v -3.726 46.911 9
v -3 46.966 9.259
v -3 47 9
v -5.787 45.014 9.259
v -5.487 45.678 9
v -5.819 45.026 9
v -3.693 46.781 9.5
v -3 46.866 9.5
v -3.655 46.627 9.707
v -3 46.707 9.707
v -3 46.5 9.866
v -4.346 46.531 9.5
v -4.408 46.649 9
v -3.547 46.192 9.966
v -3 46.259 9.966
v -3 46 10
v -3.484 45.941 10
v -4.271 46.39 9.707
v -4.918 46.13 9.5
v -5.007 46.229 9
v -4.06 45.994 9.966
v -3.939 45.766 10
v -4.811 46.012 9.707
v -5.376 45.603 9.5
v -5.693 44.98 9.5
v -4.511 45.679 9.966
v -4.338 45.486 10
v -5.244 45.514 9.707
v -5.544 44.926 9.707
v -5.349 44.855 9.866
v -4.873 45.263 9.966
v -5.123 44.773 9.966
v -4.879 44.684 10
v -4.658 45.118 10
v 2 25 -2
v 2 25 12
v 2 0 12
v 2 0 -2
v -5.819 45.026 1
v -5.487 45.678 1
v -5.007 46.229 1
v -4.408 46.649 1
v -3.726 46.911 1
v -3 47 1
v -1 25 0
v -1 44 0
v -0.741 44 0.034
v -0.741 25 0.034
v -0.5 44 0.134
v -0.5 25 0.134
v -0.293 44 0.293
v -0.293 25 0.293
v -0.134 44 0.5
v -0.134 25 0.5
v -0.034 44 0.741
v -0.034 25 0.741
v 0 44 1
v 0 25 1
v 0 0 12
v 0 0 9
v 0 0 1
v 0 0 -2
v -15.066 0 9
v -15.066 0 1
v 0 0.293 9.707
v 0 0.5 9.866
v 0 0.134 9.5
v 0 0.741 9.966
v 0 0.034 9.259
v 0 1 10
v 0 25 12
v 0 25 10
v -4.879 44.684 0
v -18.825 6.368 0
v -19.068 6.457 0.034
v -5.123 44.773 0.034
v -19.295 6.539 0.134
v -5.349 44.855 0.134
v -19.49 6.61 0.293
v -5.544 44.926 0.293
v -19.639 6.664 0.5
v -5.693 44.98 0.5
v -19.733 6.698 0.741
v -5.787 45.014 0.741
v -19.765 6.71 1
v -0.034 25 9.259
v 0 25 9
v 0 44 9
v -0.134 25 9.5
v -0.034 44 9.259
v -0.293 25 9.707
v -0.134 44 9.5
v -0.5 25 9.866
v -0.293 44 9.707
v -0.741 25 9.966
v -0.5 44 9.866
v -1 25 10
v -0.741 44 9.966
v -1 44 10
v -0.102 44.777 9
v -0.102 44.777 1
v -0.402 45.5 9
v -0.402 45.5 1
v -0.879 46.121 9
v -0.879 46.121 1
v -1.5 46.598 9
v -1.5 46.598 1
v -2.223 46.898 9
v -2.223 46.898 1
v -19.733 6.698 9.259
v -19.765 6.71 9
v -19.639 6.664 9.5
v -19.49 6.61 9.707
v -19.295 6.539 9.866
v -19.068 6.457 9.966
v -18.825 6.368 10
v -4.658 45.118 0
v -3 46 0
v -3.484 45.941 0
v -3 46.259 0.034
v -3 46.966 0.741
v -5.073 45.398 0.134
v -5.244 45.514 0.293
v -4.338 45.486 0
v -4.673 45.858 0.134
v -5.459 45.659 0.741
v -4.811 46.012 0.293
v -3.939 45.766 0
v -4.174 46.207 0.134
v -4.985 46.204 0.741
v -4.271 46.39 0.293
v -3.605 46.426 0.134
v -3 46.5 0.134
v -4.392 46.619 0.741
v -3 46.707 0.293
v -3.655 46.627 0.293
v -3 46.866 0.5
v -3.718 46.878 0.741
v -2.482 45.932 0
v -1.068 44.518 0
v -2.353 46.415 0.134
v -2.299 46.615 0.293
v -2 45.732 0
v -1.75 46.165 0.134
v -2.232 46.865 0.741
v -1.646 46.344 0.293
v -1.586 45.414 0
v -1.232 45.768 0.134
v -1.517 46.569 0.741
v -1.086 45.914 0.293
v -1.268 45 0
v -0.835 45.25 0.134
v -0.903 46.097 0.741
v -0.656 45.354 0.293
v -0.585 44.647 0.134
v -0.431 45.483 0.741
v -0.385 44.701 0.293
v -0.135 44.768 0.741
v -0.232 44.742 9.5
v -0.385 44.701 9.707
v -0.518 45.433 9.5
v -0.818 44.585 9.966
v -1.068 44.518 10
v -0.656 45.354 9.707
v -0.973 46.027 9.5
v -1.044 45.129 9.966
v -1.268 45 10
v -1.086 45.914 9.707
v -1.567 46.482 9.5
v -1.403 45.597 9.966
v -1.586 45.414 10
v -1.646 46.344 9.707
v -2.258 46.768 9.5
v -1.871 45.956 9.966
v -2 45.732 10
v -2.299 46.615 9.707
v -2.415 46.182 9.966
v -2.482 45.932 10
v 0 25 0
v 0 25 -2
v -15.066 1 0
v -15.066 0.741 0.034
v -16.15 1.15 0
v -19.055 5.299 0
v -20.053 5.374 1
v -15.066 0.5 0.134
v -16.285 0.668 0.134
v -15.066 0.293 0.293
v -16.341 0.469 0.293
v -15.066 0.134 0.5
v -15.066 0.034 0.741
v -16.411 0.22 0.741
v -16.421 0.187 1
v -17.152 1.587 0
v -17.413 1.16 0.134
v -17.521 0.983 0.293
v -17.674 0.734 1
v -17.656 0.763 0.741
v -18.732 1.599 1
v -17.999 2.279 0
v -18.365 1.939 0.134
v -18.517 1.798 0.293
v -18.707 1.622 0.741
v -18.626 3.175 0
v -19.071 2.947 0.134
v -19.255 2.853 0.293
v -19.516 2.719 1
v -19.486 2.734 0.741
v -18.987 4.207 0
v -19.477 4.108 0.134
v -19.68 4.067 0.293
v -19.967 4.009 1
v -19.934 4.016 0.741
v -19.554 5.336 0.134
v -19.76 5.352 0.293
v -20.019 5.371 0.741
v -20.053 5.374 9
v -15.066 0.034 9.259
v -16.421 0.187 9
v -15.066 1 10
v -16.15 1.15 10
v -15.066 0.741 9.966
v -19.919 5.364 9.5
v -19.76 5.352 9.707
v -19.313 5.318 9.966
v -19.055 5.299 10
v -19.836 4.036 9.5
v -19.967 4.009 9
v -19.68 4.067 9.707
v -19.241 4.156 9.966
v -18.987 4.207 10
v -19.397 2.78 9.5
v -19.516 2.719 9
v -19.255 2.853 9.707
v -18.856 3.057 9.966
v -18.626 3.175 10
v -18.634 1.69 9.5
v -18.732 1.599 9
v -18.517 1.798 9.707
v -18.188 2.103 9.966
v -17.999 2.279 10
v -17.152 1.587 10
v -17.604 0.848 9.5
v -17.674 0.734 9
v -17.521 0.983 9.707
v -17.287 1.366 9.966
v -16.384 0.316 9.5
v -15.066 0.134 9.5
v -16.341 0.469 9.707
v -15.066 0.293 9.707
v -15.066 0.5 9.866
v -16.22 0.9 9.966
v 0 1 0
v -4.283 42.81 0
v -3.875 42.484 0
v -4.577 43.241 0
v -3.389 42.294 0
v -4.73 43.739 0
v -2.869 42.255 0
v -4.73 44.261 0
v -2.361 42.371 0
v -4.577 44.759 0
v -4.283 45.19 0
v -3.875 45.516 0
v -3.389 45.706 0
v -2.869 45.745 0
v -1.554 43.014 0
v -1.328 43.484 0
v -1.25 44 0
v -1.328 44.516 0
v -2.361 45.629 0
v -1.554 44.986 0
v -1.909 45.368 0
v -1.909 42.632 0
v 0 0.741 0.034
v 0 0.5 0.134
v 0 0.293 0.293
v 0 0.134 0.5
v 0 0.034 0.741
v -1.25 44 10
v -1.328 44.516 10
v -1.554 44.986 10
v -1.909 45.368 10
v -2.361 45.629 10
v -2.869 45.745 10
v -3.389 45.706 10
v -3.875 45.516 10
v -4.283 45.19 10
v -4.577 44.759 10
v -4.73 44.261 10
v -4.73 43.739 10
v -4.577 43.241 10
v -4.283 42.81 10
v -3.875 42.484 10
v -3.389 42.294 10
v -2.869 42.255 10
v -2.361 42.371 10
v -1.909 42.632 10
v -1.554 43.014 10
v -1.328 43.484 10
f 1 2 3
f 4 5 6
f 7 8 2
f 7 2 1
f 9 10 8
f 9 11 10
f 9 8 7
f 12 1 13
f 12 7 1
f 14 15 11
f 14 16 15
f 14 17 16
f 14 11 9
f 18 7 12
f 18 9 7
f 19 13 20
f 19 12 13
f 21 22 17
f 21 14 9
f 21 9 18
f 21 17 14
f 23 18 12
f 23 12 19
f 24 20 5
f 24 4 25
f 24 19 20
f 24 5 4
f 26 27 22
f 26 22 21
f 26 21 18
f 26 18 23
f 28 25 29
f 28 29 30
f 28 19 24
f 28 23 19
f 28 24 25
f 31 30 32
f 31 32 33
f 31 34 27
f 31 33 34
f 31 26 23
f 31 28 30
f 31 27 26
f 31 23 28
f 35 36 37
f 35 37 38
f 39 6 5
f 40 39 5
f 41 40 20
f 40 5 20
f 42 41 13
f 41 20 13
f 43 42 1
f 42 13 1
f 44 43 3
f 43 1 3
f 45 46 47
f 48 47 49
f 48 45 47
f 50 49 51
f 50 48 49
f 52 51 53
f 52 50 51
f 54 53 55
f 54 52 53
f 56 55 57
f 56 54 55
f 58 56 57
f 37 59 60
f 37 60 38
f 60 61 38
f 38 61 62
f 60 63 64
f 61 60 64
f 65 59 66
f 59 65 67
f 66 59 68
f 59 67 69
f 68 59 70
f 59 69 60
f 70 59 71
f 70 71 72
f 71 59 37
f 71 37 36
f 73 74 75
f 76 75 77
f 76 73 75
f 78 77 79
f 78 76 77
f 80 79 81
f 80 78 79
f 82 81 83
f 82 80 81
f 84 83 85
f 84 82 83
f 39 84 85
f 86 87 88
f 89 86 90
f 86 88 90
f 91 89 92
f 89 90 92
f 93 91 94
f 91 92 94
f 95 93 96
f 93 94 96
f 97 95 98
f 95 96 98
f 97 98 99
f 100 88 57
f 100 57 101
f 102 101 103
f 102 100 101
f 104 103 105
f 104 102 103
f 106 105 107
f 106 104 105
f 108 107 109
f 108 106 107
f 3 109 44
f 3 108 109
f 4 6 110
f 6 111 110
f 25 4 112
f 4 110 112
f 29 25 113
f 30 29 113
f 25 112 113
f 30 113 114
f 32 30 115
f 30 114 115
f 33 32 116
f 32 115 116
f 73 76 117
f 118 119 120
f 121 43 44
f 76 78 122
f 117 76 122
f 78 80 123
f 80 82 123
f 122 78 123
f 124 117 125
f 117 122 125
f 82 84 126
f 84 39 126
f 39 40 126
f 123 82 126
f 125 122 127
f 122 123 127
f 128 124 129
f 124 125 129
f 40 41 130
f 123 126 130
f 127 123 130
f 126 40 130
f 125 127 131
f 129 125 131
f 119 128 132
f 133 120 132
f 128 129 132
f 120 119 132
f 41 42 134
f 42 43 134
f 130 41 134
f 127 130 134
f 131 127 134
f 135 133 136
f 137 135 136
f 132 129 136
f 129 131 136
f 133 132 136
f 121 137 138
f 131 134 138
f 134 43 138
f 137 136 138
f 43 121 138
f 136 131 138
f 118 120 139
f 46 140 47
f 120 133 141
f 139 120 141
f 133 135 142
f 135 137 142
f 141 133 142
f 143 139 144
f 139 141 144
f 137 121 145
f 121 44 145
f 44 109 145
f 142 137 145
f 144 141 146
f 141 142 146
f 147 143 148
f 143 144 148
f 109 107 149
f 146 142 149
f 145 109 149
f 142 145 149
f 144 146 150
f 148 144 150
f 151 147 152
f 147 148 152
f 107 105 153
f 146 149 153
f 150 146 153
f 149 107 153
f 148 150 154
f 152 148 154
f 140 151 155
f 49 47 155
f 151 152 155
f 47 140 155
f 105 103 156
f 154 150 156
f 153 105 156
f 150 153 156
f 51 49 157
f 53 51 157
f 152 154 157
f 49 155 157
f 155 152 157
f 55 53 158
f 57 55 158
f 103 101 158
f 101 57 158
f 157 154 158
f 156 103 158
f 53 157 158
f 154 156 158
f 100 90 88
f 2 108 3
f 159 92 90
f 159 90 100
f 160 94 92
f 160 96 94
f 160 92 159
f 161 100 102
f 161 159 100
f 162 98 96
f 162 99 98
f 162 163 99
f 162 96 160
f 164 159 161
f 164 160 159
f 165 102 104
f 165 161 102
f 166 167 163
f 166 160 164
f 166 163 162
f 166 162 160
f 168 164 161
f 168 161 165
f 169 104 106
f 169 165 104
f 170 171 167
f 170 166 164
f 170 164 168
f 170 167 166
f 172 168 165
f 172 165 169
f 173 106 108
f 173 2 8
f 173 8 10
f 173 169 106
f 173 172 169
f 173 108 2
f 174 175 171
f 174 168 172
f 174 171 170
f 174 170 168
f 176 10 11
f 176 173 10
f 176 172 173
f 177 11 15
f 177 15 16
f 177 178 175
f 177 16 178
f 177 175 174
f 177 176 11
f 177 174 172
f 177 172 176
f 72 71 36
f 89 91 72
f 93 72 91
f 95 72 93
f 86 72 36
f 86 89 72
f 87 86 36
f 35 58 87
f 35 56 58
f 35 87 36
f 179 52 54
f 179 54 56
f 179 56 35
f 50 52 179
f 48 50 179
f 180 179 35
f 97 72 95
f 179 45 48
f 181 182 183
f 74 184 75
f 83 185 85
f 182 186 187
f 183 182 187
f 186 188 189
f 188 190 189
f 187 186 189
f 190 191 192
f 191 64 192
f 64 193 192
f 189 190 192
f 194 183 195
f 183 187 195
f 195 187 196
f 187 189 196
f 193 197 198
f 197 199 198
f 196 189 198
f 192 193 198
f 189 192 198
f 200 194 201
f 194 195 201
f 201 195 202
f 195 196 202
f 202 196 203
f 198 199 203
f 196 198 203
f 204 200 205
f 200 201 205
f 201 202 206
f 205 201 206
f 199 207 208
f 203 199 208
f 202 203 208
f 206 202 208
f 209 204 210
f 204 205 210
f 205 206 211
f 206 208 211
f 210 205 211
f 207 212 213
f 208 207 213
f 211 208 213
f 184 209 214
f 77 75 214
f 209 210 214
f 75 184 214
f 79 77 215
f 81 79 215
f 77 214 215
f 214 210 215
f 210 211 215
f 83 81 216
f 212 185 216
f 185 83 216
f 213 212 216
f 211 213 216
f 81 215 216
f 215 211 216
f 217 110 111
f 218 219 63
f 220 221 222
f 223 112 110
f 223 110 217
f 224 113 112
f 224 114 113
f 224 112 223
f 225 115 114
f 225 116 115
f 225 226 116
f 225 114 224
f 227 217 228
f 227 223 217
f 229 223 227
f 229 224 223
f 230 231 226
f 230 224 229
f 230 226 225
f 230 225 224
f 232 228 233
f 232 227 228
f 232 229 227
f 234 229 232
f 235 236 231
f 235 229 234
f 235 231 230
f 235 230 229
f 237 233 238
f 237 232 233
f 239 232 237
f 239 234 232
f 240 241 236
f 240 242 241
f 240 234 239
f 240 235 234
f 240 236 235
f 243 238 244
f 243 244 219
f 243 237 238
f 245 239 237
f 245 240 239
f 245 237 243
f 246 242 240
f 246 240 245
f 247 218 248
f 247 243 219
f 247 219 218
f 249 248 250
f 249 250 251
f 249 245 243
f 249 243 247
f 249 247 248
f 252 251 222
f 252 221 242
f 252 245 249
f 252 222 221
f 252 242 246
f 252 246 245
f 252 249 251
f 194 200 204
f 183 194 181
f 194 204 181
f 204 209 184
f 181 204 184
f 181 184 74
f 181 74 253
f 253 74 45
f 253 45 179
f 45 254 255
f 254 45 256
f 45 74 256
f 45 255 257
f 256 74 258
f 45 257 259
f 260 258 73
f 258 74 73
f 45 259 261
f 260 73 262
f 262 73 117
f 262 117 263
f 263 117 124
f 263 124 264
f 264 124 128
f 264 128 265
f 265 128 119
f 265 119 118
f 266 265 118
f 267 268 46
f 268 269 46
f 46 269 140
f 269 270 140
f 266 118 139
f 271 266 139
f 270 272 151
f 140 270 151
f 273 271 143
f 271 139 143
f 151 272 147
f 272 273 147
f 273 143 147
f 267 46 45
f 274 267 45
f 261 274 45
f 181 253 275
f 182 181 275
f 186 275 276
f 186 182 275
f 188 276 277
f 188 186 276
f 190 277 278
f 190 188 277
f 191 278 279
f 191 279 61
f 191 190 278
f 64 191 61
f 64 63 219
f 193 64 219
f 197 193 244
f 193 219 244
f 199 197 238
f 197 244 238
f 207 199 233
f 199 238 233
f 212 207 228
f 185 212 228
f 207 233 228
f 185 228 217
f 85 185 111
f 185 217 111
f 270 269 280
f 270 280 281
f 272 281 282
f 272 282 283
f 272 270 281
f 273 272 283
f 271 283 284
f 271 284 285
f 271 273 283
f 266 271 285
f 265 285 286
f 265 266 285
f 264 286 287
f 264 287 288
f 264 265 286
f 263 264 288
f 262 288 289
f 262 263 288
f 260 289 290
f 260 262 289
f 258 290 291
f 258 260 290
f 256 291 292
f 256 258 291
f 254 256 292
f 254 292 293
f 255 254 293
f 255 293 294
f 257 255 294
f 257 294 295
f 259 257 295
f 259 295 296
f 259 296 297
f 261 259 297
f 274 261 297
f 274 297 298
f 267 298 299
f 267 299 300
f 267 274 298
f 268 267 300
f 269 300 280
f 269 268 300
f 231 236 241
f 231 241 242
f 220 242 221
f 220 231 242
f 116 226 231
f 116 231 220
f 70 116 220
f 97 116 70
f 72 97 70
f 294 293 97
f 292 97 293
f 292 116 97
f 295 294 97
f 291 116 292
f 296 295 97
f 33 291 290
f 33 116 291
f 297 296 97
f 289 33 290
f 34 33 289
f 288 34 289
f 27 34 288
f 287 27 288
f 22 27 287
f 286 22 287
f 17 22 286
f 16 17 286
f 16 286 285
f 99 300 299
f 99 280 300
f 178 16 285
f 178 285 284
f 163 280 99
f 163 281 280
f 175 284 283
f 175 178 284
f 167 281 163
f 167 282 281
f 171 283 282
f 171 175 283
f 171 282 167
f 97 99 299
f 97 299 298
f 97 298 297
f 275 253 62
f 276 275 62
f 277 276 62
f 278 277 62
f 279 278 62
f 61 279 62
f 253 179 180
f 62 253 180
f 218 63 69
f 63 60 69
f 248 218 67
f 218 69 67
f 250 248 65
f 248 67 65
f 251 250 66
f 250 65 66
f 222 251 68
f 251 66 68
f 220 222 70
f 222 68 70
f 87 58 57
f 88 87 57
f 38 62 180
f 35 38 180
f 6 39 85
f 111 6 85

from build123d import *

# Parameters (mm, degrees)
SKIZZE1_R                       = 1.75
AUFSATZ_LINEAR_AUSTRAGEN1_DEPTH = 10
SKIZZE2_W                       = 14
SKIZZE2_H                       = 25
AUFSATZ_LINEAR_AUSTRAGEN2_DEPTH = 2
VERRUNDUNG5_R                   = 3
VERRUNDUNG6_R                   = 5
VERRUNDUNG7_R                   = 1


with BuildPart() as part:
    # Skizze1 → Aufsatz-Linear austragen1 (new body)
    with BuildSketch(Plane.XY):
        Polygon((0, 0), (0, 47), (-5.100622615, 47), (-22.207223625, 0), align=None)
        with Locations((-3, 44)):
            Circle(SKIZZE1_R, mode=Mode.SUBTRACT)
    extrude(amount=AUFSATZ_LINEAR_AUSTRAGEN1_DEPTH)

    # Skizze2 → Aufsatz-Linear austragen2 (add)
    with BuildSketch(Plane(origin=(0, 0, 0), x_dir=(0, 0, -1), z_dir=(1, 0, 0))):
        with Locations((-5, 12.5)):
            Rectangle(SKIZZE2_W, SKIZZE2_H)
    extrude(amount=AUFSATZ_LINEAR_AUSTRAGEN2_DEPTH)

    # Verrundung5
    verrundung5_edges = [part.edges().sort_by_distance(p)[0] for p in [
        (-5.100622615, 47, 5),
        (0, 47, 5),
    ]]
    fillet(verrundung5_edges, radius=VERRUNDUNG5_R - 0.0001)  # a hair under: the kernel refuses the full size

    # Verrundung6
    verrundung6_edges = [part.edges().sort_by_distance(p)[0] for p in [
        (-22.207223625, 0, 5),
    ]]
    fillet(verrundung6_edges, radius=VERRUNDUNG6_R)

    # Verrundung7
    verrundung7_edges = [part.edges().sort_by_distance(p)[0] for p in [
        (-4.720741972, 46.457474218, 0),
        (-0.878650367, 46.121349633, 0),
        (0, 34.50005, 0),
        (0, 34.50005, 10),
        (-4.720741972, 46.457474218, 10),
        (-0.878650367, 46.121349633, 10),
        (-19.162243813, 2.132117818, 0),
        (-19.162243813, 2.132117818, 10),
        (-7.533241796, 0, 10),
        (-7.533241796, 0, 0),
        (-12.792000305, 25.868113472, 0),
        (-12.792000305, 25.868113472, 10),
    ]]
    fillet(verrundung7_edges, radius=VERRUNDUNG7_R)


solid = part.part
